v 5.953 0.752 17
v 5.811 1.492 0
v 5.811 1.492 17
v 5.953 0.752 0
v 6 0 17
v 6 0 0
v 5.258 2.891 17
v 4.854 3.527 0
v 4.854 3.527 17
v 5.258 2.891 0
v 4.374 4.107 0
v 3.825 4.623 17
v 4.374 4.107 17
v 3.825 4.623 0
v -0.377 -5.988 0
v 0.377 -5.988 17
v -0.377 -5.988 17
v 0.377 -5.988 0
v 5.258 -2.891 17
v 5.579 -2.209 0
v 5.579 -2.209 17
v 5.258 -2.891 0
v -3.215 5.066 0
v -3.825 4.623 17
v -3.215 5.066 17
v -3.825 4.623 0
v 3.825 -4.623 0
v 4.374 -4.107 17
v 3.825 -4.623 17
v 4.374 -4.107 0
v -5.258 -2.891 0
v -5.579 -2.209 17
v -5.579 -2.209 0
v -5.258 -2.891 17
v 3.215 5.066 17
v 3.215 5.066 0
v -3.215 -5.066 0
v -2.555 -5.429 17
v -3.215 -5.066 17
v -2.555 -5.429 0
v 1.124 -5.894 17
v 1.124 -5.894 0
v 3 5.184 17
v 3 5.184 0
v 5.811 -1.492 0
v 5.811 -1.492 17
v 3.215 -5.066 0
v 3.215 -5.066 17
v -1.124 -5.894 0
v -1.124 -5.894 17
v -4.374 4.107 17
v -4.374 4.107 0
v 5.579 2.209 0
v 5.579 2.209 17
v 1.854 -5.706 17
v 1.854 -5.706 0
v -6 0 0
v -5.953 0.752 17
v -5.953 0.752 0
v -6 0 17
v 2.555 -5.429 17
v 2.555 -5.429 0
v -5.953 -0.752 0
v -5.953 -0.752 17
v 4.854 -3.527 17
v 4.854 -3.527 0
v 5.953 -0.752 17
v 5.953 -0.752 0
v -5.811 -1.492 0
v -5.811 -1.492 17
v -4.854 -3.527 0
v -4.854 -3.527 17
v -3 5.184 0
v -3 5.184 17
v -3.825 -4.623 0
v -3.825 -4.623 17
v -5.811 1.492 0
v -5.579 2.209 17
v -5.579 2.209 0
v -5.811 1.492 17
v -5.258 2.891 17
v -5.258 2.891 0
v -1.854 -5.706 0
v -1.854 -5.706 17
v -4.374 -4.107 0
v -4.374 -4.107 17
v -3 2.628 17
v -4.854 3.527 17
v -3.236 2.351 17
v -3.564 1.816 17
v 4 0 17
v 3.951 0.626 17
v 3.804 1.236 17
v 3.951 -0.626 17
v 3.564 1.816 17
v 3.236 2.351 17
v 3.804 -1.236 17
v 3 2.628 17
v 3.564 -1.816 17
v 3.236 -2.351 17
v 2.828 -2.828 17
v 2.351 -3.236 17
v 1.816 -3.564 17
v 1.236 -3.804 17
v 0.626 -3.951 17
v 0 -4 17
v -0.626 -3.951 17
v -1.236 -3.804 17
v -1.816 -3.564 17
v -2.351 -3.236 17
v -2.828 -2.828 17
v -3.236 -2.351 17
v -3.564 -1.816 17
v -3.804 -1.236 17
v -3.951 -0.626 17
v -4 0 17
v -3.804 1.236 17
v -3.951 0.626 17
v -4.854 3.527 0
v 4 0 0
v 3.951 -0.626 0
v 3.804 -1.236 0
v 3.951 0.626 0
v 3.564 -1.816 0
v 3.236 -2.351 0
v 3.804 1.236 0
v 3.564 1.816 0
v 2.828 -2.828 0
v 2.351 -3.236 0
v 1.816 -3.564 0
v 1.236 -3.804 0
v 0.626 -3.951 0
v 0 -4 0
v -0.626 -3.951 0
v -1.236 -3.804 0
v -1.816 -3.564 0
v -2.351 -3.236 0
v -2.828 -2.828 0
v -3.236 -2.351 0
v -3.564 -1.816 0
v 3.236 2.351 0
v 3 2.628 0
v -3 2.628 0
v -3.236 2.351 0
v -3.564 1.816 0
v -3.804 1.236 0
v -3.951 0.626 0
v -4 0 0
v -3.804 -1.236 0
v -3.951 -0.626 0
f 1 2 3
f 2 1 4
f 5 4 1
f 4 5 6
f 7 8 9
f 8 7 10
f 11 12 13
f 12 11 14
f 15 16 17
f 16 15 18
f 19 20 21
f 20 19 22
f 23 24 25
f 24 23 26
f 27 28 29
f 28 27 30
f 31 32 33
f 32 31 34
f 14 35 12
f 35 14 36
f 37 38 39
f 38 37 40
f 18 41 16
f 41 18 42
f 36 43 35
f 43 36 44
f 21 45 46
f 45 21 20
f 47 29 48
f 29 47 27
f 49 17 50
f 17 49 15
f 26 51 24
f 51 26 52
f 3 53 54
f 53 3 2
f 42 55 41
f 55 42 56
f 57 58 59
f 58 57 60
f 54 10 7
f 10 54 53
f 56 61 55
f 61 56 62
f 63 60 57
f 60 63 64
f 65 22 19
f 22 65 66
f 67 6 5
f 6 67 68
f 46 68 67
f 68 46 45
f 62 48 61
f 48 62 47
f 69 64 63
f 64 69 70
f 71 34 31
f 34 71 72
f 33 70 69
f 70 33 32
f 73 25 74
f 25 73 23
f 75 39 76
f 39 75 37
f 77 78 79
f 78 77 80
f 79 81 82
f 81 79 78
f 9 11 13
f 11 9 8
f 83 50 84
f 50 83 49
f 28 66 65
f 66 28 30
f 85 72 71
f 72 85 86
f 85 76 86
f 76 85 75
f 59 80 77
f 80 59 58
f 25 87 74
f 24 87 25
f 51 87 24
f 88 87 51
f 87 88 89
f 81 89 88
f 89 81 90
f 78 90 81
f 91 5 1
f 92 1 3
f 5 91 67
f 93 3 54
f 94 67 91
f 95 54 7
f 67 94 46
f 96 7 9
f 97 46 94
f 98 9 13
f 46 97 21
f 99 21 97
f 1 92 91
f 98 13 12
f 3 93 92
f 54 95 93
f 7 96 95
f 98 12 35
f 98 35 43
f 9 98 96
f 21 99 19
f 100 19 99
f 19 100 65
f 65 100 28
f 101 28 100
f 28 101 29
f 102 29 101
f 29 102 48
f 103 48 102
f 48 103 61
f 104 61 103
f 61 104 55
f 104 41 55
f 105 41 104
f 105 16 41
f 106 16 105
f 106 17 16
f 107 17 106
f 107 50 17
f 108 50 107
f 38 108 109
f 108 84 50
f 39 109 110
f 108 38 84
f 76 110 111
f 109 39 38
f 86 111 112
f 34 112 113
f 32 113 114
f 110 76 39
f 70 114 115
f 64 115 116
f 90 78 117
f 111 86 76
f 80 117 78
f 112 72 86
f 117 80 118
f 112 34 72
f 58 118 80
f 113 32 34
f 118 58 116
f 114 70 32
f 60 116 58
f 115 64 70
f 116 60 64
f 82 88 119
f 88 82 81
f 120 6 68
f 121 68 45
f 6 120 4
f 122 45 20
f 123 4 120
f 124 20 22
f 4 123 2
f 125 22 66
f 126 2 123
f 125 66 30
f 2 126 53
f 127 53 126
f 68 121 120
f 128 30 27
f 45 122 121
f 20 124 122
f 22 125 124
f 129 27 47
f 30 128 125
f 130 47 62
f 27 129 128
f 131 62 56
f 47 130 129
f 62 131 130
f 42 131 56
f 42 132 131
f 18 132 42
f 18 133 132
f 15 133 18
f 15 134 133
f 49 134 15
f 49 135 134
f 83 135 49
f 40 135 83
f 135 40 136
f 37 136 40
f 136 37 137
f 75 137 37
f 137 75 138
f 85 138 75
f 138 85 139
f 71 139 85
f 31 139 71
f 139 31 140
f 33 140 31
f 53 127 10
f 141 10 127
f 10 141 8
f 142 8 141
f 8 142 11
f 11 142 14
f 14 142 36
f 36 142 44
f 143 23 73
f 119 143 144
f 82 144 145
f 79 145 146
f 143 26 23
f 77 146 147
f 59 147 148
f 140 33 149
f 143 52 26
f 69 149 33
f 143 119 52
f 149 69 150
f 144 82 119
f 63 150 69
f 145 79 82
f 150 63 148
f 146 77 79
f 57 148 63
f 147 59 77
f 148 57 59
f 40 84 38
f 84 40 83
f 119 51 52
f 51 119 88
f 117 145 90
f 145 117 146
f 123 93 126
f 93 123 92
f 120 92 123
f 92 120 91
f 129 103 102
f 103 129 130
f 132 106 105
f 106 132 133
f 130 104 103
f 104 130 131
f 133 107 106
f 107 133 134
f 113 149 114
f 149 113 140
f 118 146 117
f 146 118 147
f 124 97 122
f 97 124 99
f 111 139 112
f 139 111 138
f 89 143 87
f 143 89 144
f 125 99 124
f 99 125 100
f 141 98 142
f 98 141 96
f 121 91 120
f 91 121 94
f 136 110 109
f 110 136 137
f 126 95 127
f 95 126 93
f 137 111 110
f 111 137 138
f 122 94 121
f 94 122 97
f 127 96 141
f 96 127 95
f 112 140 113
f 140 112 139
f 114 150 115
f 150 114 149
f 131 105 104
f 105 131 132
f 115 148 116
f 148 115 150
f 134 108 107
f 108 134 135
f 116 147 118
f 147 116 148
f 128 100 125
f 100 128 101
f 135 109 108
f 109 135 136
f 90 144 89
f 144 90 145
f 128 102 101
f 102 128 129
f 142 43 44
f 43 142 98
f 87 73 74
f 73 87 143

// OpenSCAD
difference() {
  cylinder(d=12,h=17,$fn=50);
  translate([0,0,-.01]) cylinder(d=8,h=17.02,$fn=40);
  translate([-3,0,-.01]) cube([6,10,17.02]);
}
